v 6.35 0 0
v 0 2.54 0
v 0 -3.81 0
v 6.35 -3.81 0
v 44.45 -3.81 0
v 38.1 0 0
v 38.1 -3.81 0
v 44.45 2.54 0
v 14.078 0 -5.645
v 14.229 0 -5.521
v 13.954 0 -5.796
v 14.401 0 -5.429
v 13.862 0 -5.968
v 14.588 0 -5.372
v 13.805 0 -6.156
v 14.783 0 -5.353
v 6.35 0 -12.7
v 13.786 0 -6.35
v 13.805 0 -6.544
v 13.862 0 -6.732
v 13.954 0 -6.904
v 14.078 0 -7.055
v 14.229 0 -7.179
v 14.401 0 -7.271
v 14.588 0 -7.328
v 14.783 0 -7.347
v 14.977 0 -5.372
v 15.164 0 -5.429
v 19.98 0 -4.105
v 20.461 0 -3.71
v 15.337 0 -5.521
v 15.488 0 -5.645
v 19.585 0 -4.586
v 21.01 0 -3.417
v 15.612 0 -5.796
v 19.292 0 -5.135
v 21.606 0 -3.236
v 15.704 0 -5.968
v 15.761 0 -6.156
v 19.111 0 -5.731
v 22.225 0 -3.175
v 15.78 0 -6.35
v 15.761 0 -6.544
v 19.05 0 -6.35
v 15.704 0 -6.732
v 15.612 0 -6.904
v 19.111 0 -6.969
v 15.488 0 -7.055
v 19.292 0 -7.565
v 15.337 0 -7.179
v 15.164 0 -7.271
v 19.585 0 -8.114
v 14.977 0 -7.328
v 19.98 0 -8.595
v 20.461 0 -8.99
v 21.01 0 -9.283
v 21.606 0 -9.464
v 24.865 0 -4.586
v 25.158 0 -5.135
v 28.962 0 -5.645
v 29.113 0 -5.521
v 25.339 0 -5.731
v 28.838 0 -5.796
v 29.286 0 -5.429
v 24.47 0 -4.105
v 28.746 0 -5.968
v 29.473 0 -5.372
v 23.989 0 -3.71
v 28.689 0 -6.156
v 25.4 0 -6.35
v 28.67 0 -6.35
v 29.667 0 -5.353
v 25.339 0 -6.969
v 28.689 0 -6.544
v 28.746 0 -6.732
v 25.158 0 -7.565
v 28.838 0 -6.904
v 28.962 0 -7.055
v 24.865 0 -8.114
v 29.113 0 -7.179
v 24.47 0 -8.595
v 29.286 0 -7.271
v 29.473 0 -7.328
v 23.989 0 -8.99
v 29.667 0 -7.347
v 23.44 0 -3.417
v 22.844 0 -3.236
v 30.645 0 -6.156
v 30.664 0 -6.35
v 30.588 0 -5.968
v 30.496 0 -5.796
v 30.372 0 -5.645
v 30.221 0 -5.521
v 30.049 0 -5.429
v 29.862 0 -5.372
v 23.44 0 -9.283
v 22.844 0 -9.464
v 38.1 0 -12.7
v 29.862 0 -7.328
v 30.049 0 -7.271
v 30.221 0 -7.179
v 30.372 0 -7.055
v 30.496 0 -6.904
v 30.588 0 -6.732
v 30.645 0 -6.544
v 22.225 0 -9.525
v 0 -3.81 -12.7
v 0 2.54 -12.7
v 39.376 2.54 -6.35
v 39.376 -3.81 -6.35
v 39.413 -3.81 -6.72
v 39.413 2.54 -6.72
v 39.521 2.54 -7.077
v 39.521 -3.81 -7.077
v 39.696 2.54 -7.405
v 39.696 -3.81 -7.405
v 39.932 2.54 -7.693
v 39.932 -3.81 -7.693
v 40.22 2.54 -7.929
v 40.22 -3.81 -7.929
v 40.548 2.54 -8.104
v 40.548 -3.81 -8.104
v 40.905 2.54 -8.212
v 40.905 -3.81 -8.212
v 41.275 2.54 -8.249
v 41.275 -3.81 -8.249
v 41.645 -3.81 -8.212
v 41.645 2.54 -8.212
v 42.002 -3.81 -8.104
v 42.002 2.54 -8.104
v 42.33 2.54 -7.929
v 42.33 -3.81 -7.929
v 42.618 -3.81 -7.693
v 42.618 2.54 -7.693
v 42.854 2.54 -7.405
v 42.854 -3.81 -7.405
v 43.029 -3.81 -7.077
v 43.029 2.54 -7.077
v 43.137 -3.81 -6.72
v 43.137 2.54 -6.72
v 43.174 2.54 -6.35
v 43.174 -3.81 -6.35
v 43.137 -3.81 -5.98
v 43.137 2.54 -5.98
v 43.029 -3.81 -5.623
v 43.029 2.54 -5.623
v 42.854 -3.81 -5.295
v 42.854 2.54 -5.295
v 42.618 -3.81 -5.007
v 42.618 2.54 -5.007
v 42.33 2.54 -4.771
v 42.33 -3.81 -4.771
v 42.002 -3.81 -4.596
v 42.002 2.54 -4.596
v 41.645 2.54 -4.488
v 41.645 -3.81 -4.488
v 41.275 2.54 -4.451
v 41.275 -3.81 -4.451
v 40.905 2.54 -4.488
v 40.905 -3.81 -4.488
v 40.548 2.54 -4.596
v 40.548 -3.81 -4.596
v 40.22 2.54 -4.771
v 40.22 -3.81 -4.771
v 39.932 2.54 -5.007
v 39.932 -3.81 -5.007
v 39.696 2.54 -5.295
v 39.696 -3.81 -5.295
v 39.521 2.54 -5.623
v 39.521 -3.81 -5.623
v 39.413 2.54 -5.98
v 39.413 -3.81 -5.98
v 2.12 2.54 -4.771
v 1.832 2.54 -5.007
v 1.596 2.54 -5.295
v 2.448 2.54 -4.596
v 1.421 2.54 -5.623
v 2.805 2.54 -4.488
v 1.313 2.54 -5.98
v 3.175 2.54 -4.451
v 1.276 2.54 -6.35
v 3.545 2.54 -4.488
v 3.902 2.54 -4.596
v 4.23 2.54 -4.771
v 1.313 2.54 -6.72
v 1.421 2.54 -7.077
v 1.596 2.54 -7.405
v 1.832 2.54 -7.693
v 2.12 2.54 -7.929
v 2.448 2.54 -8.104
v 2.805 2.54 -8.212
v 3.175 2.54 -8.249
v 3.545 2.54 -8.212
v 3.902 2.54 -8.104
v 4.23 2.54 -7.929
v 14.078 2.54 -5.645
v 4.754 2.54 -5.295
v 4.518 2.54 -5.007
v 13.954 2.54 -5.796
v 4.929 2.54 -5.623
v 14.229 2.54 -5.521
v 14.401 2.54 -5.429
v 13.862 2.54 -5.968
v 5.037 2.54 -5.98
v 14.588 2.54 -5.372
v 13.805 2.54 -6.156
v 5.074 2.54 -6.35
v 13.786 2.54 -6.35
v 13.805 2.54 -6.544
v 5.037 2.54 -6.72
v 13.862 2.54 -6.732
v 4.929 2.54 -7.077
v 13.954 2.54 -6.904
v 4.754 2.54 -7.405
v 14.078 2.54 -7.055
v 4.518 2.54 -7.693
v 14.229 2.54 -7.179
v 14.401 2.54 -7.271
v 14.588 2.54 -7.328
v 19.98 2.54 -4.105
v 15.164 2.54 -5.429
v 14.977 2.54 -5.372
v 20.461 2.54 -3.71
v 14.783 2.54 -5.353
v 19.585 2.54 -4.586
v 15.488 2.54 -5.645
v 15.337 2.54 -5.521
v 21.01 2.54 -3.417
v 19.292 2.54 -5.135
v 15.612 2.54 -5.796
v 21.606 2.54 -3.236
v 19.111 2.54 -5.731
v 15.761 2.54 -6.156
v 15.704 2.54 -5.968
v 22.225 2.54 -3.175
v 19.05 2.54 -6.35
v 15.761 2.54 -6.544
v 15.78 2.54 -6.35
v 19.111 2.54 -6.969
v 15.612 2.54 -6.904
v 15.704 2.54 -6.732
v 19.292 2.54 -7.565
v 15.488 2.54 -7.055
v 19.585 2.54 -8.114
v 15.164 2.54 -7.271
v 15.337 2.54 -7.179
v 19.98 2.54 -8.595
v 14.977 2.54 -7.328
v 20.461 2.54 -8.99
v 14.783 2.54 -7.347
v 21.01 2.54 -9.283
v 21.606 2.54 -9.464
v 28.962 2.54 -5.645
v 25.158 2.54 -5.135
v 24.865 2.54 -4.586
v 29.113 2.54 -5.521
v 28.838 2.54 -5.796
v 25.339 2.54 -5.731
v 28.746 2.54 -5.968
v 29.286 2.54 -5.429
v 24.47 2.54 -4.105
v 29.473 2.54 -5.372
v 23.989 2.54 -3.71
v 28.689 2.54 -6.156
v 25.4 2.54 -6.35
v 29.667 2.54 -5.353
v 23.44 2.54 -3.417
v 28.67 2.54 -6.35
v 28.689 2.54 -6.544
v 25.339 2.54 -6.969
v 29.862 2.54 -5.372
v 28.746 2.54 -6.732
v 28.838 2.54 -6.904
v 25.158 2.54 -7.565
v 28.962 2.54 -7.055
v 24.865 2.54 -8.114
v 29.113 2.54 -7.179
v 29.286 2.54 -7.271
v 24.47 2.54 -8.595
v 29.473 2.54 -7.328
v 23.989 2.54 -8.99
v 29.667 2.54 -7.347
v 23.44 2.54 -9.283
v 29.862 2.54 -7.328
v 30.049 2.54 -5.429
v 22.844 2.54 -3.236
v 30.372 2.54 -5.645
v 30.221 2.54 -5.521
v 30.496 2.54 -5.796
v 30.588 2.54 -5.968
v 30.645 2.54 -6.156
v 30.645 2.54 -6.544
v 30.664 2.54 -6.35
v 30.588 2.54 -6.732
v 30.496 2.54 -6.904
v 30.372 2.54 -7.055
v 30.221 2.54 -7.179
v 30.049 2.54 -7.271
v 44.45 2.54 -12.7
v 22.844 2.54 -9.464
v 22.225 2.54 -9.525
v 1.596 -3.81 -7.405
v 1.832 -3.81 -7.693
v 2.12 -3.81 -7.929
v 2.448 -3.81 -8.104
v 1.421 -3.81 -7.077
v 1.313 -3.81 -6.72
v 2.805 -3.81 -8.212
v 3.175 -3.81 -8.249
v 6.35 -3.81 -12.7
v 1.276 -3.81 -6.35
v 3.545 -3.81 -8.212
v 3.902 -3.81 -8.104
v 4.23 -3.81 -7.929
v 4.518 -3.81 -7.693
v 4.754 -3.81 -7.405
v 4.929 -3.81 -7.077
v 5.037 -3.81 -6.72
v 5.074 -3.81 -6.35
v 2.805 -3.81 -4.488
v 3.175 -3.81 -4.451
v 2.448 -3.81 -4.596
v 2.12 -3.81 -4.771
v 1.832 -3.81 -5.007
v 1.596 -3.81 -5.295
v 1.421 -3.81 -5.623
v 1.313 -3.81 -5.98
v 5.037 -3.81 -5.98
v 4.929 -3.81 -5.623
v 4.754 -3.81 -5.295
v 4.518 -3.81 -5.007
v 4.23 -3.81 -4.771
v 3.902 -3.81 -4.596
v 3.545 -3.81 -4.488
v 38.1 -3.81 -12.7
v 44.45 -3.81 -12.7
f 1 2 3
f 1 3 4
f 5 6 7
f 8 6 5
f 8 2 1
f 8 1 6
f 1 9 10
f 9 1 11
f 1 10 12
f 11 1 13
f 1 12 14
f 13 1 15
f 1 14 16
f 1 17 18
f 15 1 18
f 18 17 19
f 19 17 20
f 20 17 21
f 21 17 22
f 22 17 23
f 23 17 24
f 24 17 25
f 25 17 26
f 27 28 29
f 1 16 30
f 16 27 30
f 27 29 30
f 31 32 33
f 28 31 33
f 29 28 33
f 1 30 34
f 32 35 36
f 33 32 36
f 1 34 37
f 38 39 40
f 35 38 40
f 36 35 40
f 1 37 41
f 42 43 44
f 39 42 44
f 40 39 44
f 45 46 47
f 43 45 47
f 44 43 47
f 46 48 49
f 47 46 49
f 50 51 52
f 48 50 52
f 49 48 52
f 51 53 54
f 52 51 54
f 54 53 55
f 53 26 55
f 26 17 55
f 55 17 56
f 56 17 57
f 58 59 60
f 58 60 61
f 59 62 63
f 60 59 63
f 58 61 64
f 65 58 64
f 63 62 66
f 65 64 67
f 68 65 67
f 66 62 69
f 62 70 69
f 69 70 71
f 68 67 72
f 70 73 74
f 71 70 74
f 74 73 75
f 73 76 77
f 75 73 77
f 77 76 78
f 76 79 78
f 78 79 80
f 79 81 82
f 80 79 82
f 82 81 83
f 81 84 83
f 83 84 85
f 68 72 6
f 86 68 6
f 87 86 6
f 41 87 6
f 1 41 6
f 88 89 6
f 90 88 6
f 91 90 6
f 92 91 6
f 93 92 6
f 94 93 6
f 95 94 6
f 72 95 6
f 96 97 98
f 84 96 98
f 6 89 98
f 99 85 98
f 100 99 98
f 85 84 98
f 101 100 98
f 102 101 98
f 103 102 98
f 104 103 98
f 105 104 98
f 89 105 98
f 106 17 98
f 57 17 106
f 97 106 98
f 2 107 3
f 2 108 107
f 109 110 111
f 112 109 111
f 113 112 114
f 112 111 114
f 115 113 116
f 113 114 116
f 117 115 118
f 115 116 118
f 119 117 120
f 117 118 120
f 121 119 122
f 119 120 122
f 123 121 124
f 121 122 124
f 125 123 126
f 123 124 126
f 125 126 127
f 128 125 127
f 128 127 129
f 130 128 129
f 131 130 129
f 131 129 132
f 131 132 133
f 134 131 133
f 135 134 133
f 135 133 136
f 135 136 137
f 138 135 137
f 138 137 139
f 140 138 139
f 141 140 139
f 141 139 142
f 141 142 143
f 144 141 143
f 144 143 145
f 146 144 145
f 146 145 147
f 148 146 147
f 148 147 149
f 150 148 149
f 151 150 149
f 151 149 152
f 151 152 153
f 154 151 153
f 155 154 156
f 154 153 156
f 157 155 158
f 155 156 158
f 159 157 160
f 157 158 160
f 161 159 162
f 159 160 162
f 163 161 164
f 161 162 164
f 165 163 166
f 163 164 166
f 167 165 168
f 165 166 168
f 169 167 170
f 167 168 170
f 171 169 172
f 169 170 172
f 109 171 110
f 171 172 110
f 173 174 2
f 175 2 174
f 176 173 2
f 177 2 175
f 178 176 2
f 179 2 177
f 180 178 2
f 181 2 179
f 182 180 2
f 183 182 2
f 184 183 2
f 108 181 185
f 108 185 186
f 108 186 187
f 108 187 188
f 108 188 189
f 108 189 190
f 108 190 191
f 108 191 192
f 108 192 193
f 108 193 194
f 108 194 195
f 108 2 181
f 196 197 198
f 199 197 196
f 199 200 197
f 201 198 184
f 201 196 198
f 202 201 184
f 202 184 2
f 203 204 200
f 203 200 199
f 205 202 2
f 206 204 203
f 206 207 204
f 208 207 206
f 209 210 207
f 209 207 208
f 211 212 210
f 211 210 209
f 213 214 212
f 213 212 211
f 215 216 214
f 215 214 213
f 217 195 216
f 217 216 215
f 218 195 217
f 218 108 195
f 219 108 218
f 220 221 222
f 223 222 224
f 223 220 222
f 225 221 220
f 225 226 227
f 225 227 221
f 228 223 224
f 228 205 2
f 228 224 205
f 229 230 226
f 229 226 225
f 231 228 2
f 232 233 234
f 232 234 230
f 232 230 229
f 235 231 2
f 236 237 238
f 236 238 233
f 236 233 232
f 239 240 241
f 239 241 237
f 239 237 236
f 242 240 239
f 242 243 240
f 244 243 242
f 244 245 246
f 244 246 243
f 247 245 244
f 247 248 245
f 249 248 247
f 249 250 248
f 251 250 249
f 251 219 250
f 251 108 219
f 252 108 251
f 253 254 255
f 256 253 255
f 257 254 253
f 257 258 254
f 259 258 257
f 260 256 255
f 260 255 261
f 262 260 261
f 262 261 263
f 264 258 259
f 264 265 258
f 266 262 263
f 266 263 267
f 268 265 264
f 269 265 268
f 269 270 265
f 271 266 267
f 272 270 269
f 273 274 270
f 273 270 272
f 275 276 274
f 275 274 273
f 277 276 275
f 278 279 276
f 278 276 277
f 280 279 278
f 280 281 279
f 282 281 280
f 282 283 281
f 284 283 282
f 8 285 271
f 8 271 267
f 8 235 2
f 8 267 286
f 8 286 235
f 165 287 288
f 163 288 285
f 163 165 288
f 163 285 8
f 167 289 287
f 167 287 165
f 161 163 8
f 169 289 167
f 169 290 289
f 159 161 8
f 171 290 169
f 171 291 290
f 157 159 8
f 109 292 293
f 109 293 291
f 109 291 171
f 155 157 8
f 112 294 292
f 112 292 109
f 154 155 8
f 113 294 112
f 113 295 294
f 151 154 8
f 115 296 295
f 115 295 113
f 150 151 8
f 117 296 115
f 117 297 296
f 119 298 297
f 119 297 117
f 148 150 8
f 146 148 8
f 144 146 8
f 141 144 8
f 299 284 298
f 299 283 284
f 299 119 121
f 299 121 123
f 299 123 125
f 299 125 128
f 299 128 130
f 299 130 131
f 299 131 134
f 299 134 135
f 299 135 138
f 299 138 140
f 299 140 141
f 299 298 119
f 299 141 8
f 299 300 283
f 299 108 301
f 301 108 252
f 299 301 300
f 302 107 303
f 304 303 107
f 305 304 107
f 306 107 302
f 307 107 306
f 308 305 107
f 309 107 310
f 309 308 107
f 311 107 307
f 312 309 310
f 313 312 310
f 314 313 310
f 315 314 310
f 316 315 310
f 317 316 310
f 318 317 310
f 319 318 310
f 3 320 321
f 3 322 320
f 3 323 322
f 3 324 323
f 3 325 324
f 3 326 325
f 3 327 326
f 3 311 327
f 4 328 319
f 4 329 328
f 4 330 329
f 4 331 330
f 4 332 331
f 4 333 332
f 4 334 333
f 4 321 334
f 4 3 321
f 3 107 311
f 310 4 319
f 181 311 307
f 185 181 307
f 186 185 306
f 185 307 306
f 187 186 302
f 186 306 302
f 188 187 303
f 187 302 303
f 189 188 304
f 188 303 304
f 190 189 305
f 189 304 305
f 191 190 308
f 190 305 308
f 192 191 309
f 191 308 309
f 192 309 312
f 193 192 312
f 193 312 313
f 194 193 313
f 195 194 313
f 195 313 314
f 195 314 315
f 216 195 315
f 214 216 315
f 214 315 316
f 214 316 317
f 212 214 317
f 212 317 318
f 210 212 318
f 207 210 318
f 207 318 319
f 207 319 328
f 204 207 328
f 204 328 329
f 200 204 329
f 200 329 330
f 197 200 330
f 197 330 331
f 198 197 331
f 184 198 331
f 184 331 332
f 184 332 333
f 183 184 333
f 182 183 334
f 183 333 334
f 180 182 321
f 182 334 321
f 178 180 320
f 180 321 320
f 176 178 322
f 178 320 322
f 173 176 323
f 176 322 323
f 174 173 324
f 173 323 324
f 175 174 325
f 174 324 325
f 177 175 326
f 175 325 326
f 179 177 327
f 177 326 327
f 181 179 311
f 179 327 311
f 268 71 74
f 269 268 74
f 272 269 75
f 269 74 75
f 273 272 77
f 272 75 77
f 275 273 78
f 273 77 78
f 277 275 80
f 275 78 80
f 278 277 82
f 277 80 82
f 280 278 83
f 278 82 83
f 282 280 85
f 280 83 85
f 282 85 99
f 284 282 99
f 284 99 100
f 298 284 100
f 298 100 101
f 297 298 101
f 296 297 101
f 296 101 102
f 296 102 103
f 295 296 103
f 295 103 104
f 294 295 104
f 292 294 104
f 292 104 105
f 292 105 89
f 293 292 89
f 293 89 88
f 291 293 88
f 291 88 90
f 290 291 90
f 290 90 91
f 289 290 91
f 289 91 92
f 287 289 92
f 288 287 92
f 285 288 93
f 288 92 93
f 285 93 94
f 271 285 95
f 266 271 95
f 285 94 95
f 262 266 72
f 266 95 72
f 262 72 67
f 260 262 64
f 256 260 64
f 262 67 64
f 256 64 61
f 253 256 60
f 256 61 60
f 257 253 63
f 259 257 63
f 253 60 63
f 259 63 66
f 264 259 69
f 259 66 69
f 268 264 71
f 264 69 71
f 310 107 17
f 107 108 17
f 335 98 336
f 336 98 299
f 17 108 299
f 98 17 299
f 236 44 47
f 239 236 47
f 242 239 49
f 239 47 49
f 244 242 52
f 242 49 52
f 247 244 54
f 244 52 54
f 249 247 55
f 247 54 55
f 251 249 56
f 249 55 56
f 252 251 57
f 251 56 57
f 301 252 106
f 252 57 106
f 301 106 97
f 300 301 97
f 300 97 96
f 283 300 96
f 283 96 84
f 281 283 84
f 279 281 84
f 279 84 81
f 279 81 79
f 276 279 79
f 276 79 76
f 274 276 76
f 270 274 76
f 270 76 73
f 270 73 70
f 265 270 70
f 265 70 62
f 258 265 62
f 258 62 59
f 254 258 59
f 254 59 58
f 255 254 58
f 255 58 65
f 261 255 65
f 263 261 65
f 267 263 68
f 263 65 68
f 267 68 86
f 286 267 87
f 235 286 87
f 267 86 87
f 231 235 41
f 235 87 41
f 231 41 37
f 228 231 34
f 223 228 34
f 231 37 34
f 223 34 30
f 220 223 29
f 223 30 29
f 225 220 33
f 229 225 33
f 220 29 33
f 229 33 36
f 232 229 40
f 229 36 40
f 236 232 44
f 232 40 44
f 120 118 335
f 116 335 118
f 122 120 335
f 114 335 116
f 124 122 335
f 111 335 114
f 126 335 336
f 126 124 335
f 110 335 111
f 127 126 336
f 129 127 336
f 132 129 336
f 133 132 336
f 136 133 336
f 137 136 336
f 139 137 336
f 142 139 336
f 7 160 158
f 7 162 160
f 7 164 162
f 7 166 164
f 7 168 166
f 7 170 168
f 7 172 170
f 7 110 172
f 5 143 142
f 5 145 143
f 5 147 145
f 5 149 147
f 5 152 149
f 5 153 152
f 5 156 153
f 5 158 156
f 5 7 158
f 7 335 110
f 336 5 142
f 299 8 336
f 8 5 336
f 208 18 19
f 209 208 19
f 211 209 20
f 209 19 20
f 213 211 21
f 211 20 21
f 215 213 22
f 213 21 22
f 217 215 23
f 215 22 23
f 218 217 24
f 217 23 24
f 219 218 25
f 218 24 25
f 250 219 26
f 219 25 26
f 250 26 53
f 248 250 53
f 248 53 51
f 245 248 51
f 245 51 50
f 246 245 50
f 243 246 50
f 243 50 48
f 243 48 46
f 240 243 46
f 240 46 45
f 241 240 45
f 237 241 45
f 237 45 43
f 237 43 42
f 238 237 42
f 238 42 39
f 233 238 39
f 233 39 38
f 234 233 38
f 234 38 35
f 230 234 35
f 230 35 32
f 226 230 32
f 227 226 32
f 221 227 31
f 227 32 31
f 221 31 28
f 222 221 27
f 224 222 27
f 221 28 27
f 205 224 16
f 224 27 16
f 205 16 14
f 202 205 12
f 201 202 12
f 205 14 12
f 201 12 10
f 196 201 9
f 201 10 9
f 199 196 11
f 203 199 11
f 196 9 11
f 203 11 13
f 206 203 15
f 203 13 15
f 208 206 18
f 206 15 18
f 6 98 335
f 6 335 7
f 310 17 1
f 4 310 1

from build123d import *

# Parameters (mm, degrees)
SKETCH1_W                   = 44.45
SKETCH1_H                   = 12.7
BOSS_EXTRUDE1_DEPTH         = 2.54
SKETCH2_W                   = 6.35
SKETCH2_H                   = 12.7
BOSS_EXTRUDE2_DEPTH         = 3.81
F_6_CLEARANCE_HOLE1_D       = 3.7973
F_3_48_TAPPED_HOLE1_D       = 1.9939
F_1_4_0_25_DIAMETER_HOLE1_D = 6.35


with BuildPart() as part:
    # Sketch1 → Boss-Extrude1 (new body)
    with BuildSketch(Plane(origin=(0, 0, 0), x_dir=(1, 0, 0), z_dir=(0, 1, 0))):
        with Locations((22.225, 6.35)):
            Rectangle(SKETCH1_W, SKETCH1_H)
    extrude(amount=BOSS_EXTRUDE1_DEPTH)

    # Sketch2 → Boss-Extrude2 (add)
    with BuildSketch(Plane.XZ):
        with Locations((3.175, -6.35)):
            Rectangle(SKETCH2_W, SKETCH2_H)
        with Locations((41.275, -6.35)):
            Rectangle(SKETCH2_W, SKETCH2_H)
    extrude(amount=BOSS_EXTRUDE2_DEPTH)

    # #6 Clearance Hole1 (through all)
    with Locations(Plane(origin=(0, 2.54, 0), x_dir=(1, 0, 0), z_dir=(0, 1, 0))):
        with Locations((3.175, 6.35), (41.275, 6.35)):
            Hole(F_6_CLEARANCE_HOLE1_D / 2)

    # #3-48 Tapped Hole1 (through all)
    with Locations(Plane(origin=(0, 2.54, 0), x_dir=(1, 0, 0), z_dir=(0, 1, 0))):
        with Locations((14.7828, 6.35), (29.6672, 6.35)):
            Hole(F_3_48_TAPPED_HOLE1_D / 2)

    # 1/4 (0.25) Diameter Hole1 (through all)
    with Locations(Plane(origin=(0, 2.54, 0), x_dir=(1, 0, 0), z_dir=(0, 1, 0))):
        with Locations((22.225, 6.35)):
            Hole(F_1_4_0_25_DIAMETER_HOLE1_D / 2)


solid = part.part
